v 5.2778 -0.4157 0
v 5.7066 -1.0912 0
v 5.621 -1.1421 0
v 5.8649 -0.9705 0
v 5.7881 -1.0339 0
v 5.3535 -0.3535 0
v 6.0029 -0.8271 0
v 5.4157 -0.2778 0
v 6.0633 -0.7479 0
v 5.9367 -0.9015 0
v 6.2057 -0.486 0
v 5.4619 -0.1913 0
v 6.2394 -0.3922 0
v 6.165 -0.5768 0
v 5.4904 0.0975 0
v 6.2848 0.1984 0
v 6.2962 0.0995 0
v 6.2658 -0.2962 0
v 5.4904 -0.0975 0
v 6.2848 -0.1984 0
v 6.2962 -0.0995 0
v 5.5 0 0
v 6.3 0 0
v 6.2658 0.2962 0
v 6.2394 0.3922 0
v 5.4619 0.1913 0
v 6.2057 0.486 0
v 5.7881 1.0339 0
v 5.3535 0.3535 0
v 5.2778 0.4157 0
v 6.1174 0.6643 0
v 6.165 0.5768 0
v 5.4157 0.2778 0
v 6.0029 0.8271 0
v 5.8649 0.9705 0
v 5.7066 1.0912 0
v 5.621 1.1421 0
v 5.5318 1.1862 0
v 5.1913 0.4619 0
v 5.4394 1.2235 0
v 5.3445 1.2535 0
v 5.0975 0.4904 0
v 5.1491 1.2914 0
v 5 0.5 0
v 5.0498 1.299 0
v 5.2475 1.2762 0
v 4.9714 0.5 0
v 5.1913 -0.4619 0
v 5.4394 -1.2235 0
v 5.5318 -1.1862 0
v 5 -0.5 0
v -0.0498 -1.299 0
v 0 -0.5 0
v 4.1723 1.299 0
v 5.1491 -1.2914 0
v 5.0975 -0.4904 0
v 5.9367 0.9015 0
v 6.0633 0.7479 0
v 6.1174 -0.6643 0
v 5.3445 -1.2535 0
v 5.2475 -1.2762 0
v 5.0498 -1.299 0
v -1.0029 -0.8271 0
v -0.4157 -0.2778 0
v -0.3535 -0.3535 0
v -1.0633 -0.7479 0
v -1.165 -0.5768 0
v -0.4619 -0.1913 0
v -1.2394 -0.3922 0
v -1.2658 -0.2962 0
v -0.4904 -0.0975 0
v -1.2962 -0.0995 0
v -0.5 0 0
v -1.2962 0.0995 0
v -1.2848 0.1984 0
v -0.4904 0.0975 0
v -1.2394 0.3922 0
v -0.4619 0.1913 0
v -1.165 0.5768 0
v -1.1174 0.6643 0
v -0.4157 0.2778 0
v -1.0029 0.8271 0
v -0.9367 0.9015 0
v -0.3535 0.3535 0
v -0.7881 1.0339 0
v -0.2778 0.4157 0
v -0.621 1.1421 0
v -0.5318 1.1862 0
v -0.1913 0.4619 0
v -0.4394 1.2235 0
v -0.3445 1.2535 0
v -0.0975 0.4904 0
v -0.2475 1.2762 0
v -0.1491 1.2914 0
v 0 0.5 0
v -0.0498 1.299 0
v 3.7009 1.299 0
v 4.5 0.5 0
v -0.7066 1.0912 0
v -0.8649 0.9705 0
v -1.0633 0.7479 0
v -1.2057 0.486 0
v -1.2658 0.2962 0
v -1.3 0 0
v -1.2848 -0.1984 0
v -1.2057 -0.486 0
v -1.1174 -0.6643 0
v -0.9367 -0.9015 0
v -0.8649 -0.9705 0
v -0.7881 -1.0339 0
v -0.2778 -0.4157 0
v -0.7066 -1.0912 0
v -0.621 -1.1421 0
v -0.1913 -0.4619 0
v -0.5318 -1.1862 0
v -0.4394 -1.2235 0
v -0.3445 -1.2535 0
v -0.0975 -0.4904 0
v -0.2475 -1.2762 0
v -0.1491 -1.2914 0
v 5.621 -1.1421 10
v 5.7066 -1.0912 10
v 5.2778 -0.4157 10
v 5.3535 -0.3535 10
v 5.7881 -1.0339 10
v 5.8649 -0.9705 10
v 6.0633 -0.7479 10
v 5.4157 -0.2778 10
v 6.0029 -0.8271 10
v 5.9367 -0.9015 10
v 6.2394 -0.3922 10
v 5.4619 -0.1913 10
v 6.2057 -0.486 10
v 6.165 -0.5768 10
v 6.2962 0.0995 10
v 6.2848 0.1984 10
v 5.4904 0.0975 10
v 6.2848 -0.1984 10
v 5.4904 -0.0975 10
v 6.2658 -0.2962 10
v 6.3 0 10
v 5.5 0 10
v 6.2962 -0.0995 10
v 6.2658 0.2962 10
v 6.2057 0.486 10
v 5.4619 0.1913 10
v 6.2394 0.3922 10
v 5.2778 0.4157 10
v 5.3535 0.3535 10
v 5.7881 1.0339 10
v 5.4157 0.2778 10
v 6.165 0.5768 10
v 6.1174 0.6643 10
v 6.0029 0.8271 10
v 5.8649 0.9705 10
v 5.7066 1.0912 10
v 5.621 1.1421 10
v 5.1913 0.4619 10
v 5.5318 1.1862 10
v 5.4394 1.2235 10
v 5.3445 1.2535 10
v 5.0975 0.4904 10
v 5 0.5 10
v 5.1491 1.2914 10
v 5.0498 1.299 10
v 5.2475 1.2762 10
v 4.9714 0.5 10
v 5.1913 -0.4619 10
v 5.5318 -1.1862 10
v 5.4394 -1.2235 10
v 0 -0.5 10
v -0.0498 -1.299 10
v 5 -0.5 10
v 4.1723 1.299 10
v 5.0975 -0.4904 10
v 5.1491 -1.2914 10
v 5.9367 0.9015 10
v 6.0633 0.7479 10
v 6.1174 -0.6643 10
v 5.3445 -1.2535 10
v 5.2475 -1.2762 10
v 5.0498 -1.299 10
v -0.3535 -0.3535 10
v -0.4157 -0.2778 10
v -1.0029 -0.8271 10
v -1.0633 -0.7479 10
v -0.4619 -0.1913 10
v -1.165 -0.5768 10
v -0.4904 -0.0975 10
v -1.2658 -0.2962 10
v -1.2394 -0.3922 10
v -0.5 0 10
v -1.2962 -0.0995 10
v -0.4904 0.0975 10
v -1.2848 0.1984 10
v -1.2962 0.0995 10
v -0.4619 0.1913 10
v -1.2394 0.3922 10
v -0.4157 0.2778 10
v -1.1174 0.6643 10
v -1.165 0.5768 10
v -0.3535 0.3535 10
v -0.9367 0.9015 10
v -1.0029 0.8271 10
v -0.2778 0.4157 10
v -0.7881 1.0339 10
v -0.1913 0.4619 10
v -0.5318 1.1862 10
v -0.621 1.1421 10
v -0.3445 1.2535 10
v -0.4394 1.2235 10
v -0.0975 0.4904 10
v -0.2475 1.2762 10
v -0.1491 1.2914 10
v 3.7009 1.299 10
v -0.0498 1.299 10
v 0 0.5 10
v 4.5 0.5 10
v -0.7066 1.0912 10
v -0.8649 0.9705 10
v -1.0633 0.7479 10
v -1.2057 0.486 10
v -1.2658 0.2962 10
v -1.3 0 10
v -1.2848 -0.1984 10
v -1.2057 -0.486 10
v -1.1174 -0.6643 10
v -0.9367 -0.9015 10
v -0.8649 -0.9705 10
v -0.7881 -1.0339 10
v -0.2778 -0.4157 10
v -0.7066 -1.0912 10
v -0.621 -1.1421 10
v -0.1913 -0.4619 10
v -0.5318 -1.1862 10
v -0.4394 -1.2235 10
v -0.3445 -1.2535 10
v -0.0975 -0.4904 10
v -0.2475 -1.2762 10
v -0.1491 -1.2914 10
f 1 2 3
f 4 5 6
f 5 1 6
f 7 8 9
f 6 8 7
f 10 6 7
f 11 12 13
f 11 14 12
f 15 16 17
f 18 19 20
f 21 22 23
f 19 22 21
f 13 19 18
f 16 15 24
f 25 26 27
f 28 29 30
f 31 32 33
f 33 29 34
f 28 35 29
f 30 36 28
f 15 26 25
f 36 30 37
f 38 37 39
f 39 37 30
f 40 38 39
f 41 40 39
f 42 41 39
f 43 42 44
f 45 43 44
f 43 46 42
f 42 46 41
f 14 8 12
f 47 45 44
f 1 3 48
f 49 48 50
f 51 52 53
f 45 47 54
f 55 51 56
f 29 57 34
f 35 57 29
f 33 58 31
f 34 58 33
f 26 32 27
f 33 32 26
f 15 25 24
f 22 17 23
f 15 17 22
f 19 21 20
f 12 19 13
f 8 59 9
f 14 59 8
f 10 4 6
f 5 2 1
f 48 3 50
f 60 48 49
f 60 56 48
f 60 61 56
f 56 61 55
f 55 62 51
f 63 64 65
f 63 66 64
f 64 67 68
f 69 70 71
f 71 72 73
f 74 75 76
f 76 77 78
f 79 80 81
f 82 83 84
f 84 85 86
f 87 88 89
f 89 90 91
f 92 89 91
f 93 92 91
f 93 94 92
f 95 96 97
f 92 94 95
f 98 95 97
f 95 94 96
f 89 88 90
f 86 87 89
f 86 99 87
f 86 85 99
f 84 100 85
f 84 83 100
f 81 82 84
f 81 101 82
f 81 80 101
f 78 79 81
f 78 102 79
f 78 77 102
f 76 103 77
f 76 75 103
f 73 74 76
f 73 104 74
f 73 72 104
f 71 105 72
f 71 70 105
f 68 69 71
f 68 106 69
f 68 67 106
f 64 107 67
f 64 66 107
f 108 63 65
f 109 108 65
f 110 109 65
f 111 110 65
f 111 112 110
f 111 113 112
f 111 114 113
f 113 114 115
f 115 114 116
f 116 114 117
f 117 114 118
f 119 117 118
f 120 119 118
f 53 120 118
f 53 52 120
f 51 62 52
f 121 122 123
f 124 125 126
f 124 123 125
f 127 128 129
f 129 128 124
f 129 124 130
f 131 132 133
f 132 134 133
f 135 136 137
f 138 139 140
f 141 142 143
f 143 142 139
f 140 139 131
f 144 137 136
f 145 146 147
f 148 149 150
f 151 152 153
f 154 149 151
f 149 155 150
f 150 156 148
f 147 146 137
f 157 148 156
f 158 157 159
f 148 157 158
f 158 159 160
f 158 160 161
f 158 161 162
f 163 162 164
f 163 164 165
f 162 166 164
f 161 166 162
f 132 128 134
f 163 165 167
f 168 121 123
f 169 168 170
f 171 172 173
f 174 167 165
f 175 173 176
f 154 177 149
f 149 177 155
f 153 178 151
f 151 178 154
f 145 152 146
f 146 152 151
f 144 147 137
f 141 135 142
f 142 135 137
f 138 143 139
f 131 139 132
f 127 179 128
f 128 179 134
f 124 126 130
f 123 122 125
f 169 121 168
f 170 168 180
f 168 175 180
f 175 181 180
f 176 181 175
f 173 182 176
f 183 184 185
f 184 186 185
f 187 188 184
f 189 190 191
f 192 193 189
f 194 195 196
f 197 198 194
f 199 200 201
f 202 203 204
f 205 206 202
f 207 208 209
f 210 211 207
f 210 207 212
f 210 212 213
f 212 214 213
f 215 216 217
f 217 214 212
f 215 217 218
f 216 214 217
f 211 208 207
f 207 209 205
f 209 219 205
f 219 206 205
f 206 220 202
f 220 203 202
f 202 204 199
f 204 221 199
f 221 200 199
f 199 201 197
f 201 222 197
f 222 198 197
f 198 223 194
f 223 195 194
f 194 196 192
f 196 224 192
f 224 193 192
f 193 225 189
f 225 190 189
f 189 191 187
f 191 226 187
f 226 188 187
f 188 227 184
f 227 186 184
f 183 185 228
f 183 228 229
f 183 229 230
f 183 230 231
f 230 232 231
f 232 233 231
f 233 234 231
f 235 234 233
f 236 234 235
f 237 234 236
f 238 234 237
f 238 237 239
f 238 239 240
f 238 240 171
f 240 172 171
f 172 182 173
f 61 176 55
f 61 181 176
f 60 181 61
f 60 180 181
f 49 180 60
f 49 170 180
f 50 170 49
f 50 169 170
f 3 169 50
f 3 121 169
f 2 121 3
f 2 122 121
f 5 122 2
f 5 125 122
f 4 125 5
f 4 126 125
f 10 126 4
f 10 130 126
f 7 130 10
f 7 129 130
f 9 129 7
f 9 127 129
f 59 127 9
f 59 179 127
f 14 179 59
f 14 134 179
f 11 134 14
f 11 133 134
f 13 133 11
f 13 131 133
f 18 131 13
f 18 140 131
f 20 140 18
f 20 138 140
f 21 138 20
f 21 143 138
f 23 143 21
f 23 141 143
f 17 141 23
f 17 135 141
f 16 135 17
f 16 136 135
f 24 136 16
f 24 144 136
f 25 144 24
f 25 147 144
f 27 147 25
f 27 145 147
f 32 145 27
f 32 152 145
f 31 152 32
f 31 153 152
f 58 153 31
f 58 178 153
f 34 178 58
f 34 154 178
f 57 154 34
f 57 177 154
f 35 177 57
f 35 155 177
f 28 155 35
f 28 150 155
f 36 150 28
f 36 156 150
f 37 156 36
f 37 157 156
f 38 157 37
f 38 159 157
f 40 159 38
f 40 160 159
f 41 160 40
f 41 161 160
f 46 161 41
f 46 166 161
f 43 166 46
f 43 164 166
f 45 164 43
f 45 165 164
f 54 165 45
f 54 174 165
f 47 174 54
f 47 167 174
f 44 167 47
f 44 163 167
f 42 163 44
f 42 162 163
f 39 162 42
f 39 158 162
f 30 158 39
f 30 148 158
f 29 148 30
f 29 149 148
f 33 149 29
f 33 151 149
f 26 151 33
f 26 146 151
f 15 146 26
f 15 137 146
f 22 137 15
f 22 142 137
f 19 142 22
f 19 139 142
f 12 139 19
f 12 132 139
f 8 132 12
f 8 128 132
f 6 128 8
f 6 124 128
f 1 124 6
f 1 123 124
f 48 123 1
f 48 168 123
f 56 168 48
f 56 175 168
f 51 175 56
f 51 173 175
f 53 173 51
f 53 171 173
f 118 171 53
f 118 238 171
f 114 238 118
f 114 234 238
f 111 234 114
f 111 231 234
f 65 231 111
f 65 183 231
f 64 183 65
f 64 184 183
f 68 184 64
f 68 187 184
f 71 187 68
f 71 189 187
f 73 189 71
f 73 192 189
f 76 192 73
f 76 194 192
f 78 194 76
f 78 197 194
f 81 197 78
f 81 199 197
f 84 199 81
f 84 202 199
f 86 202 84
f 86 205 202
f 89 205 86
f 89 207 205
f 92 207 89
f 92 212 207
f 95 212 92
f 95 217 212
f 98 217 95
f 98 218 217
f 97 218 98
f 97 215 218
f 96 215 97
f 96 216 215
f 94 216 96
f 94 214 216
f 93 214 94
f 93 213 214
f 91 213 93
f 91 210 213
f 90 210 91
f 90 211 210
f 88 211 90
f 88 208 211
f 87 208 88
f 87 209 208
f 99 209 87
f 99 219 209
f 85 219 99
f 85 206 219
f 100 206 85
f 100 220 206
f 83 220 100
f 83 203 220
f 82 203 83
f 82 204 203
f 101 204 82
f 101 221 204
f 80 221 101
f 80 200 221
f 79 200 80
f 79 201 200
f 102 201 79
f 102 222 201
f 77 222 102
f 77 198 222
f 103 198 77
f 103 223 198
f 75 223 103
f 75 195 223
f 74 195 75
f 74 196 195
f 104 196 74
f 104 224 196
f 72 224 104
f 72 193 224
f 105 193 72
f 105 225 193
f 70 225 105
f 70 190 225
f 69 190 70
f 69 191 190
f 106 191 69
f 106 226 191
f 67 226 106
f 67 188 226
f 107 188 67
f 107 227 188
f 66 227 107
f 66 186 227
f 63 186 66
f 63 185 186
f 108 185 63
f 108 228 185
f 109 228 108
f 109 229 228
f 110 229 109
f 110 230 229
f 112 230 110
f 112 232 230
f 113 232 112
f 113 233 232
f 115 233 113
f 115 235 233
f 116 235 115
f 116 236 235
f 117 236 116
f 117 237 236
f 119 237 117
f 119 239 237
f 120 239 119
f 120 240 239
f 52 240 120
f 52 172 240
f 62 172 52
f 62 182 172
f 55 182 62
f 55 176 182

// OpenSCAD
wire_count = 5;
wire_d = 1;
wire_dist = 0;
l = 10;
t = 0.8;

$fa = 0.1;
$fs = 0.1;

width = wire_count*(wire_d+wire_dist);

linear_extrude(l)
difference() {

hull() {
circle(d = wire_d + t*2);

translate([width,0])
circle(d = wire_d + t*2);
}


hull() {
translate([(wire_d + wire_dist)*wire_count,0])
circle(d = wire_d);

//translate([(wire_d + wire_dist)*wire_count,0])
circle(d = wire_d);
}

translate([width,0])
rotate(45)
square([wire_d/3,wire_d*2]);

}
